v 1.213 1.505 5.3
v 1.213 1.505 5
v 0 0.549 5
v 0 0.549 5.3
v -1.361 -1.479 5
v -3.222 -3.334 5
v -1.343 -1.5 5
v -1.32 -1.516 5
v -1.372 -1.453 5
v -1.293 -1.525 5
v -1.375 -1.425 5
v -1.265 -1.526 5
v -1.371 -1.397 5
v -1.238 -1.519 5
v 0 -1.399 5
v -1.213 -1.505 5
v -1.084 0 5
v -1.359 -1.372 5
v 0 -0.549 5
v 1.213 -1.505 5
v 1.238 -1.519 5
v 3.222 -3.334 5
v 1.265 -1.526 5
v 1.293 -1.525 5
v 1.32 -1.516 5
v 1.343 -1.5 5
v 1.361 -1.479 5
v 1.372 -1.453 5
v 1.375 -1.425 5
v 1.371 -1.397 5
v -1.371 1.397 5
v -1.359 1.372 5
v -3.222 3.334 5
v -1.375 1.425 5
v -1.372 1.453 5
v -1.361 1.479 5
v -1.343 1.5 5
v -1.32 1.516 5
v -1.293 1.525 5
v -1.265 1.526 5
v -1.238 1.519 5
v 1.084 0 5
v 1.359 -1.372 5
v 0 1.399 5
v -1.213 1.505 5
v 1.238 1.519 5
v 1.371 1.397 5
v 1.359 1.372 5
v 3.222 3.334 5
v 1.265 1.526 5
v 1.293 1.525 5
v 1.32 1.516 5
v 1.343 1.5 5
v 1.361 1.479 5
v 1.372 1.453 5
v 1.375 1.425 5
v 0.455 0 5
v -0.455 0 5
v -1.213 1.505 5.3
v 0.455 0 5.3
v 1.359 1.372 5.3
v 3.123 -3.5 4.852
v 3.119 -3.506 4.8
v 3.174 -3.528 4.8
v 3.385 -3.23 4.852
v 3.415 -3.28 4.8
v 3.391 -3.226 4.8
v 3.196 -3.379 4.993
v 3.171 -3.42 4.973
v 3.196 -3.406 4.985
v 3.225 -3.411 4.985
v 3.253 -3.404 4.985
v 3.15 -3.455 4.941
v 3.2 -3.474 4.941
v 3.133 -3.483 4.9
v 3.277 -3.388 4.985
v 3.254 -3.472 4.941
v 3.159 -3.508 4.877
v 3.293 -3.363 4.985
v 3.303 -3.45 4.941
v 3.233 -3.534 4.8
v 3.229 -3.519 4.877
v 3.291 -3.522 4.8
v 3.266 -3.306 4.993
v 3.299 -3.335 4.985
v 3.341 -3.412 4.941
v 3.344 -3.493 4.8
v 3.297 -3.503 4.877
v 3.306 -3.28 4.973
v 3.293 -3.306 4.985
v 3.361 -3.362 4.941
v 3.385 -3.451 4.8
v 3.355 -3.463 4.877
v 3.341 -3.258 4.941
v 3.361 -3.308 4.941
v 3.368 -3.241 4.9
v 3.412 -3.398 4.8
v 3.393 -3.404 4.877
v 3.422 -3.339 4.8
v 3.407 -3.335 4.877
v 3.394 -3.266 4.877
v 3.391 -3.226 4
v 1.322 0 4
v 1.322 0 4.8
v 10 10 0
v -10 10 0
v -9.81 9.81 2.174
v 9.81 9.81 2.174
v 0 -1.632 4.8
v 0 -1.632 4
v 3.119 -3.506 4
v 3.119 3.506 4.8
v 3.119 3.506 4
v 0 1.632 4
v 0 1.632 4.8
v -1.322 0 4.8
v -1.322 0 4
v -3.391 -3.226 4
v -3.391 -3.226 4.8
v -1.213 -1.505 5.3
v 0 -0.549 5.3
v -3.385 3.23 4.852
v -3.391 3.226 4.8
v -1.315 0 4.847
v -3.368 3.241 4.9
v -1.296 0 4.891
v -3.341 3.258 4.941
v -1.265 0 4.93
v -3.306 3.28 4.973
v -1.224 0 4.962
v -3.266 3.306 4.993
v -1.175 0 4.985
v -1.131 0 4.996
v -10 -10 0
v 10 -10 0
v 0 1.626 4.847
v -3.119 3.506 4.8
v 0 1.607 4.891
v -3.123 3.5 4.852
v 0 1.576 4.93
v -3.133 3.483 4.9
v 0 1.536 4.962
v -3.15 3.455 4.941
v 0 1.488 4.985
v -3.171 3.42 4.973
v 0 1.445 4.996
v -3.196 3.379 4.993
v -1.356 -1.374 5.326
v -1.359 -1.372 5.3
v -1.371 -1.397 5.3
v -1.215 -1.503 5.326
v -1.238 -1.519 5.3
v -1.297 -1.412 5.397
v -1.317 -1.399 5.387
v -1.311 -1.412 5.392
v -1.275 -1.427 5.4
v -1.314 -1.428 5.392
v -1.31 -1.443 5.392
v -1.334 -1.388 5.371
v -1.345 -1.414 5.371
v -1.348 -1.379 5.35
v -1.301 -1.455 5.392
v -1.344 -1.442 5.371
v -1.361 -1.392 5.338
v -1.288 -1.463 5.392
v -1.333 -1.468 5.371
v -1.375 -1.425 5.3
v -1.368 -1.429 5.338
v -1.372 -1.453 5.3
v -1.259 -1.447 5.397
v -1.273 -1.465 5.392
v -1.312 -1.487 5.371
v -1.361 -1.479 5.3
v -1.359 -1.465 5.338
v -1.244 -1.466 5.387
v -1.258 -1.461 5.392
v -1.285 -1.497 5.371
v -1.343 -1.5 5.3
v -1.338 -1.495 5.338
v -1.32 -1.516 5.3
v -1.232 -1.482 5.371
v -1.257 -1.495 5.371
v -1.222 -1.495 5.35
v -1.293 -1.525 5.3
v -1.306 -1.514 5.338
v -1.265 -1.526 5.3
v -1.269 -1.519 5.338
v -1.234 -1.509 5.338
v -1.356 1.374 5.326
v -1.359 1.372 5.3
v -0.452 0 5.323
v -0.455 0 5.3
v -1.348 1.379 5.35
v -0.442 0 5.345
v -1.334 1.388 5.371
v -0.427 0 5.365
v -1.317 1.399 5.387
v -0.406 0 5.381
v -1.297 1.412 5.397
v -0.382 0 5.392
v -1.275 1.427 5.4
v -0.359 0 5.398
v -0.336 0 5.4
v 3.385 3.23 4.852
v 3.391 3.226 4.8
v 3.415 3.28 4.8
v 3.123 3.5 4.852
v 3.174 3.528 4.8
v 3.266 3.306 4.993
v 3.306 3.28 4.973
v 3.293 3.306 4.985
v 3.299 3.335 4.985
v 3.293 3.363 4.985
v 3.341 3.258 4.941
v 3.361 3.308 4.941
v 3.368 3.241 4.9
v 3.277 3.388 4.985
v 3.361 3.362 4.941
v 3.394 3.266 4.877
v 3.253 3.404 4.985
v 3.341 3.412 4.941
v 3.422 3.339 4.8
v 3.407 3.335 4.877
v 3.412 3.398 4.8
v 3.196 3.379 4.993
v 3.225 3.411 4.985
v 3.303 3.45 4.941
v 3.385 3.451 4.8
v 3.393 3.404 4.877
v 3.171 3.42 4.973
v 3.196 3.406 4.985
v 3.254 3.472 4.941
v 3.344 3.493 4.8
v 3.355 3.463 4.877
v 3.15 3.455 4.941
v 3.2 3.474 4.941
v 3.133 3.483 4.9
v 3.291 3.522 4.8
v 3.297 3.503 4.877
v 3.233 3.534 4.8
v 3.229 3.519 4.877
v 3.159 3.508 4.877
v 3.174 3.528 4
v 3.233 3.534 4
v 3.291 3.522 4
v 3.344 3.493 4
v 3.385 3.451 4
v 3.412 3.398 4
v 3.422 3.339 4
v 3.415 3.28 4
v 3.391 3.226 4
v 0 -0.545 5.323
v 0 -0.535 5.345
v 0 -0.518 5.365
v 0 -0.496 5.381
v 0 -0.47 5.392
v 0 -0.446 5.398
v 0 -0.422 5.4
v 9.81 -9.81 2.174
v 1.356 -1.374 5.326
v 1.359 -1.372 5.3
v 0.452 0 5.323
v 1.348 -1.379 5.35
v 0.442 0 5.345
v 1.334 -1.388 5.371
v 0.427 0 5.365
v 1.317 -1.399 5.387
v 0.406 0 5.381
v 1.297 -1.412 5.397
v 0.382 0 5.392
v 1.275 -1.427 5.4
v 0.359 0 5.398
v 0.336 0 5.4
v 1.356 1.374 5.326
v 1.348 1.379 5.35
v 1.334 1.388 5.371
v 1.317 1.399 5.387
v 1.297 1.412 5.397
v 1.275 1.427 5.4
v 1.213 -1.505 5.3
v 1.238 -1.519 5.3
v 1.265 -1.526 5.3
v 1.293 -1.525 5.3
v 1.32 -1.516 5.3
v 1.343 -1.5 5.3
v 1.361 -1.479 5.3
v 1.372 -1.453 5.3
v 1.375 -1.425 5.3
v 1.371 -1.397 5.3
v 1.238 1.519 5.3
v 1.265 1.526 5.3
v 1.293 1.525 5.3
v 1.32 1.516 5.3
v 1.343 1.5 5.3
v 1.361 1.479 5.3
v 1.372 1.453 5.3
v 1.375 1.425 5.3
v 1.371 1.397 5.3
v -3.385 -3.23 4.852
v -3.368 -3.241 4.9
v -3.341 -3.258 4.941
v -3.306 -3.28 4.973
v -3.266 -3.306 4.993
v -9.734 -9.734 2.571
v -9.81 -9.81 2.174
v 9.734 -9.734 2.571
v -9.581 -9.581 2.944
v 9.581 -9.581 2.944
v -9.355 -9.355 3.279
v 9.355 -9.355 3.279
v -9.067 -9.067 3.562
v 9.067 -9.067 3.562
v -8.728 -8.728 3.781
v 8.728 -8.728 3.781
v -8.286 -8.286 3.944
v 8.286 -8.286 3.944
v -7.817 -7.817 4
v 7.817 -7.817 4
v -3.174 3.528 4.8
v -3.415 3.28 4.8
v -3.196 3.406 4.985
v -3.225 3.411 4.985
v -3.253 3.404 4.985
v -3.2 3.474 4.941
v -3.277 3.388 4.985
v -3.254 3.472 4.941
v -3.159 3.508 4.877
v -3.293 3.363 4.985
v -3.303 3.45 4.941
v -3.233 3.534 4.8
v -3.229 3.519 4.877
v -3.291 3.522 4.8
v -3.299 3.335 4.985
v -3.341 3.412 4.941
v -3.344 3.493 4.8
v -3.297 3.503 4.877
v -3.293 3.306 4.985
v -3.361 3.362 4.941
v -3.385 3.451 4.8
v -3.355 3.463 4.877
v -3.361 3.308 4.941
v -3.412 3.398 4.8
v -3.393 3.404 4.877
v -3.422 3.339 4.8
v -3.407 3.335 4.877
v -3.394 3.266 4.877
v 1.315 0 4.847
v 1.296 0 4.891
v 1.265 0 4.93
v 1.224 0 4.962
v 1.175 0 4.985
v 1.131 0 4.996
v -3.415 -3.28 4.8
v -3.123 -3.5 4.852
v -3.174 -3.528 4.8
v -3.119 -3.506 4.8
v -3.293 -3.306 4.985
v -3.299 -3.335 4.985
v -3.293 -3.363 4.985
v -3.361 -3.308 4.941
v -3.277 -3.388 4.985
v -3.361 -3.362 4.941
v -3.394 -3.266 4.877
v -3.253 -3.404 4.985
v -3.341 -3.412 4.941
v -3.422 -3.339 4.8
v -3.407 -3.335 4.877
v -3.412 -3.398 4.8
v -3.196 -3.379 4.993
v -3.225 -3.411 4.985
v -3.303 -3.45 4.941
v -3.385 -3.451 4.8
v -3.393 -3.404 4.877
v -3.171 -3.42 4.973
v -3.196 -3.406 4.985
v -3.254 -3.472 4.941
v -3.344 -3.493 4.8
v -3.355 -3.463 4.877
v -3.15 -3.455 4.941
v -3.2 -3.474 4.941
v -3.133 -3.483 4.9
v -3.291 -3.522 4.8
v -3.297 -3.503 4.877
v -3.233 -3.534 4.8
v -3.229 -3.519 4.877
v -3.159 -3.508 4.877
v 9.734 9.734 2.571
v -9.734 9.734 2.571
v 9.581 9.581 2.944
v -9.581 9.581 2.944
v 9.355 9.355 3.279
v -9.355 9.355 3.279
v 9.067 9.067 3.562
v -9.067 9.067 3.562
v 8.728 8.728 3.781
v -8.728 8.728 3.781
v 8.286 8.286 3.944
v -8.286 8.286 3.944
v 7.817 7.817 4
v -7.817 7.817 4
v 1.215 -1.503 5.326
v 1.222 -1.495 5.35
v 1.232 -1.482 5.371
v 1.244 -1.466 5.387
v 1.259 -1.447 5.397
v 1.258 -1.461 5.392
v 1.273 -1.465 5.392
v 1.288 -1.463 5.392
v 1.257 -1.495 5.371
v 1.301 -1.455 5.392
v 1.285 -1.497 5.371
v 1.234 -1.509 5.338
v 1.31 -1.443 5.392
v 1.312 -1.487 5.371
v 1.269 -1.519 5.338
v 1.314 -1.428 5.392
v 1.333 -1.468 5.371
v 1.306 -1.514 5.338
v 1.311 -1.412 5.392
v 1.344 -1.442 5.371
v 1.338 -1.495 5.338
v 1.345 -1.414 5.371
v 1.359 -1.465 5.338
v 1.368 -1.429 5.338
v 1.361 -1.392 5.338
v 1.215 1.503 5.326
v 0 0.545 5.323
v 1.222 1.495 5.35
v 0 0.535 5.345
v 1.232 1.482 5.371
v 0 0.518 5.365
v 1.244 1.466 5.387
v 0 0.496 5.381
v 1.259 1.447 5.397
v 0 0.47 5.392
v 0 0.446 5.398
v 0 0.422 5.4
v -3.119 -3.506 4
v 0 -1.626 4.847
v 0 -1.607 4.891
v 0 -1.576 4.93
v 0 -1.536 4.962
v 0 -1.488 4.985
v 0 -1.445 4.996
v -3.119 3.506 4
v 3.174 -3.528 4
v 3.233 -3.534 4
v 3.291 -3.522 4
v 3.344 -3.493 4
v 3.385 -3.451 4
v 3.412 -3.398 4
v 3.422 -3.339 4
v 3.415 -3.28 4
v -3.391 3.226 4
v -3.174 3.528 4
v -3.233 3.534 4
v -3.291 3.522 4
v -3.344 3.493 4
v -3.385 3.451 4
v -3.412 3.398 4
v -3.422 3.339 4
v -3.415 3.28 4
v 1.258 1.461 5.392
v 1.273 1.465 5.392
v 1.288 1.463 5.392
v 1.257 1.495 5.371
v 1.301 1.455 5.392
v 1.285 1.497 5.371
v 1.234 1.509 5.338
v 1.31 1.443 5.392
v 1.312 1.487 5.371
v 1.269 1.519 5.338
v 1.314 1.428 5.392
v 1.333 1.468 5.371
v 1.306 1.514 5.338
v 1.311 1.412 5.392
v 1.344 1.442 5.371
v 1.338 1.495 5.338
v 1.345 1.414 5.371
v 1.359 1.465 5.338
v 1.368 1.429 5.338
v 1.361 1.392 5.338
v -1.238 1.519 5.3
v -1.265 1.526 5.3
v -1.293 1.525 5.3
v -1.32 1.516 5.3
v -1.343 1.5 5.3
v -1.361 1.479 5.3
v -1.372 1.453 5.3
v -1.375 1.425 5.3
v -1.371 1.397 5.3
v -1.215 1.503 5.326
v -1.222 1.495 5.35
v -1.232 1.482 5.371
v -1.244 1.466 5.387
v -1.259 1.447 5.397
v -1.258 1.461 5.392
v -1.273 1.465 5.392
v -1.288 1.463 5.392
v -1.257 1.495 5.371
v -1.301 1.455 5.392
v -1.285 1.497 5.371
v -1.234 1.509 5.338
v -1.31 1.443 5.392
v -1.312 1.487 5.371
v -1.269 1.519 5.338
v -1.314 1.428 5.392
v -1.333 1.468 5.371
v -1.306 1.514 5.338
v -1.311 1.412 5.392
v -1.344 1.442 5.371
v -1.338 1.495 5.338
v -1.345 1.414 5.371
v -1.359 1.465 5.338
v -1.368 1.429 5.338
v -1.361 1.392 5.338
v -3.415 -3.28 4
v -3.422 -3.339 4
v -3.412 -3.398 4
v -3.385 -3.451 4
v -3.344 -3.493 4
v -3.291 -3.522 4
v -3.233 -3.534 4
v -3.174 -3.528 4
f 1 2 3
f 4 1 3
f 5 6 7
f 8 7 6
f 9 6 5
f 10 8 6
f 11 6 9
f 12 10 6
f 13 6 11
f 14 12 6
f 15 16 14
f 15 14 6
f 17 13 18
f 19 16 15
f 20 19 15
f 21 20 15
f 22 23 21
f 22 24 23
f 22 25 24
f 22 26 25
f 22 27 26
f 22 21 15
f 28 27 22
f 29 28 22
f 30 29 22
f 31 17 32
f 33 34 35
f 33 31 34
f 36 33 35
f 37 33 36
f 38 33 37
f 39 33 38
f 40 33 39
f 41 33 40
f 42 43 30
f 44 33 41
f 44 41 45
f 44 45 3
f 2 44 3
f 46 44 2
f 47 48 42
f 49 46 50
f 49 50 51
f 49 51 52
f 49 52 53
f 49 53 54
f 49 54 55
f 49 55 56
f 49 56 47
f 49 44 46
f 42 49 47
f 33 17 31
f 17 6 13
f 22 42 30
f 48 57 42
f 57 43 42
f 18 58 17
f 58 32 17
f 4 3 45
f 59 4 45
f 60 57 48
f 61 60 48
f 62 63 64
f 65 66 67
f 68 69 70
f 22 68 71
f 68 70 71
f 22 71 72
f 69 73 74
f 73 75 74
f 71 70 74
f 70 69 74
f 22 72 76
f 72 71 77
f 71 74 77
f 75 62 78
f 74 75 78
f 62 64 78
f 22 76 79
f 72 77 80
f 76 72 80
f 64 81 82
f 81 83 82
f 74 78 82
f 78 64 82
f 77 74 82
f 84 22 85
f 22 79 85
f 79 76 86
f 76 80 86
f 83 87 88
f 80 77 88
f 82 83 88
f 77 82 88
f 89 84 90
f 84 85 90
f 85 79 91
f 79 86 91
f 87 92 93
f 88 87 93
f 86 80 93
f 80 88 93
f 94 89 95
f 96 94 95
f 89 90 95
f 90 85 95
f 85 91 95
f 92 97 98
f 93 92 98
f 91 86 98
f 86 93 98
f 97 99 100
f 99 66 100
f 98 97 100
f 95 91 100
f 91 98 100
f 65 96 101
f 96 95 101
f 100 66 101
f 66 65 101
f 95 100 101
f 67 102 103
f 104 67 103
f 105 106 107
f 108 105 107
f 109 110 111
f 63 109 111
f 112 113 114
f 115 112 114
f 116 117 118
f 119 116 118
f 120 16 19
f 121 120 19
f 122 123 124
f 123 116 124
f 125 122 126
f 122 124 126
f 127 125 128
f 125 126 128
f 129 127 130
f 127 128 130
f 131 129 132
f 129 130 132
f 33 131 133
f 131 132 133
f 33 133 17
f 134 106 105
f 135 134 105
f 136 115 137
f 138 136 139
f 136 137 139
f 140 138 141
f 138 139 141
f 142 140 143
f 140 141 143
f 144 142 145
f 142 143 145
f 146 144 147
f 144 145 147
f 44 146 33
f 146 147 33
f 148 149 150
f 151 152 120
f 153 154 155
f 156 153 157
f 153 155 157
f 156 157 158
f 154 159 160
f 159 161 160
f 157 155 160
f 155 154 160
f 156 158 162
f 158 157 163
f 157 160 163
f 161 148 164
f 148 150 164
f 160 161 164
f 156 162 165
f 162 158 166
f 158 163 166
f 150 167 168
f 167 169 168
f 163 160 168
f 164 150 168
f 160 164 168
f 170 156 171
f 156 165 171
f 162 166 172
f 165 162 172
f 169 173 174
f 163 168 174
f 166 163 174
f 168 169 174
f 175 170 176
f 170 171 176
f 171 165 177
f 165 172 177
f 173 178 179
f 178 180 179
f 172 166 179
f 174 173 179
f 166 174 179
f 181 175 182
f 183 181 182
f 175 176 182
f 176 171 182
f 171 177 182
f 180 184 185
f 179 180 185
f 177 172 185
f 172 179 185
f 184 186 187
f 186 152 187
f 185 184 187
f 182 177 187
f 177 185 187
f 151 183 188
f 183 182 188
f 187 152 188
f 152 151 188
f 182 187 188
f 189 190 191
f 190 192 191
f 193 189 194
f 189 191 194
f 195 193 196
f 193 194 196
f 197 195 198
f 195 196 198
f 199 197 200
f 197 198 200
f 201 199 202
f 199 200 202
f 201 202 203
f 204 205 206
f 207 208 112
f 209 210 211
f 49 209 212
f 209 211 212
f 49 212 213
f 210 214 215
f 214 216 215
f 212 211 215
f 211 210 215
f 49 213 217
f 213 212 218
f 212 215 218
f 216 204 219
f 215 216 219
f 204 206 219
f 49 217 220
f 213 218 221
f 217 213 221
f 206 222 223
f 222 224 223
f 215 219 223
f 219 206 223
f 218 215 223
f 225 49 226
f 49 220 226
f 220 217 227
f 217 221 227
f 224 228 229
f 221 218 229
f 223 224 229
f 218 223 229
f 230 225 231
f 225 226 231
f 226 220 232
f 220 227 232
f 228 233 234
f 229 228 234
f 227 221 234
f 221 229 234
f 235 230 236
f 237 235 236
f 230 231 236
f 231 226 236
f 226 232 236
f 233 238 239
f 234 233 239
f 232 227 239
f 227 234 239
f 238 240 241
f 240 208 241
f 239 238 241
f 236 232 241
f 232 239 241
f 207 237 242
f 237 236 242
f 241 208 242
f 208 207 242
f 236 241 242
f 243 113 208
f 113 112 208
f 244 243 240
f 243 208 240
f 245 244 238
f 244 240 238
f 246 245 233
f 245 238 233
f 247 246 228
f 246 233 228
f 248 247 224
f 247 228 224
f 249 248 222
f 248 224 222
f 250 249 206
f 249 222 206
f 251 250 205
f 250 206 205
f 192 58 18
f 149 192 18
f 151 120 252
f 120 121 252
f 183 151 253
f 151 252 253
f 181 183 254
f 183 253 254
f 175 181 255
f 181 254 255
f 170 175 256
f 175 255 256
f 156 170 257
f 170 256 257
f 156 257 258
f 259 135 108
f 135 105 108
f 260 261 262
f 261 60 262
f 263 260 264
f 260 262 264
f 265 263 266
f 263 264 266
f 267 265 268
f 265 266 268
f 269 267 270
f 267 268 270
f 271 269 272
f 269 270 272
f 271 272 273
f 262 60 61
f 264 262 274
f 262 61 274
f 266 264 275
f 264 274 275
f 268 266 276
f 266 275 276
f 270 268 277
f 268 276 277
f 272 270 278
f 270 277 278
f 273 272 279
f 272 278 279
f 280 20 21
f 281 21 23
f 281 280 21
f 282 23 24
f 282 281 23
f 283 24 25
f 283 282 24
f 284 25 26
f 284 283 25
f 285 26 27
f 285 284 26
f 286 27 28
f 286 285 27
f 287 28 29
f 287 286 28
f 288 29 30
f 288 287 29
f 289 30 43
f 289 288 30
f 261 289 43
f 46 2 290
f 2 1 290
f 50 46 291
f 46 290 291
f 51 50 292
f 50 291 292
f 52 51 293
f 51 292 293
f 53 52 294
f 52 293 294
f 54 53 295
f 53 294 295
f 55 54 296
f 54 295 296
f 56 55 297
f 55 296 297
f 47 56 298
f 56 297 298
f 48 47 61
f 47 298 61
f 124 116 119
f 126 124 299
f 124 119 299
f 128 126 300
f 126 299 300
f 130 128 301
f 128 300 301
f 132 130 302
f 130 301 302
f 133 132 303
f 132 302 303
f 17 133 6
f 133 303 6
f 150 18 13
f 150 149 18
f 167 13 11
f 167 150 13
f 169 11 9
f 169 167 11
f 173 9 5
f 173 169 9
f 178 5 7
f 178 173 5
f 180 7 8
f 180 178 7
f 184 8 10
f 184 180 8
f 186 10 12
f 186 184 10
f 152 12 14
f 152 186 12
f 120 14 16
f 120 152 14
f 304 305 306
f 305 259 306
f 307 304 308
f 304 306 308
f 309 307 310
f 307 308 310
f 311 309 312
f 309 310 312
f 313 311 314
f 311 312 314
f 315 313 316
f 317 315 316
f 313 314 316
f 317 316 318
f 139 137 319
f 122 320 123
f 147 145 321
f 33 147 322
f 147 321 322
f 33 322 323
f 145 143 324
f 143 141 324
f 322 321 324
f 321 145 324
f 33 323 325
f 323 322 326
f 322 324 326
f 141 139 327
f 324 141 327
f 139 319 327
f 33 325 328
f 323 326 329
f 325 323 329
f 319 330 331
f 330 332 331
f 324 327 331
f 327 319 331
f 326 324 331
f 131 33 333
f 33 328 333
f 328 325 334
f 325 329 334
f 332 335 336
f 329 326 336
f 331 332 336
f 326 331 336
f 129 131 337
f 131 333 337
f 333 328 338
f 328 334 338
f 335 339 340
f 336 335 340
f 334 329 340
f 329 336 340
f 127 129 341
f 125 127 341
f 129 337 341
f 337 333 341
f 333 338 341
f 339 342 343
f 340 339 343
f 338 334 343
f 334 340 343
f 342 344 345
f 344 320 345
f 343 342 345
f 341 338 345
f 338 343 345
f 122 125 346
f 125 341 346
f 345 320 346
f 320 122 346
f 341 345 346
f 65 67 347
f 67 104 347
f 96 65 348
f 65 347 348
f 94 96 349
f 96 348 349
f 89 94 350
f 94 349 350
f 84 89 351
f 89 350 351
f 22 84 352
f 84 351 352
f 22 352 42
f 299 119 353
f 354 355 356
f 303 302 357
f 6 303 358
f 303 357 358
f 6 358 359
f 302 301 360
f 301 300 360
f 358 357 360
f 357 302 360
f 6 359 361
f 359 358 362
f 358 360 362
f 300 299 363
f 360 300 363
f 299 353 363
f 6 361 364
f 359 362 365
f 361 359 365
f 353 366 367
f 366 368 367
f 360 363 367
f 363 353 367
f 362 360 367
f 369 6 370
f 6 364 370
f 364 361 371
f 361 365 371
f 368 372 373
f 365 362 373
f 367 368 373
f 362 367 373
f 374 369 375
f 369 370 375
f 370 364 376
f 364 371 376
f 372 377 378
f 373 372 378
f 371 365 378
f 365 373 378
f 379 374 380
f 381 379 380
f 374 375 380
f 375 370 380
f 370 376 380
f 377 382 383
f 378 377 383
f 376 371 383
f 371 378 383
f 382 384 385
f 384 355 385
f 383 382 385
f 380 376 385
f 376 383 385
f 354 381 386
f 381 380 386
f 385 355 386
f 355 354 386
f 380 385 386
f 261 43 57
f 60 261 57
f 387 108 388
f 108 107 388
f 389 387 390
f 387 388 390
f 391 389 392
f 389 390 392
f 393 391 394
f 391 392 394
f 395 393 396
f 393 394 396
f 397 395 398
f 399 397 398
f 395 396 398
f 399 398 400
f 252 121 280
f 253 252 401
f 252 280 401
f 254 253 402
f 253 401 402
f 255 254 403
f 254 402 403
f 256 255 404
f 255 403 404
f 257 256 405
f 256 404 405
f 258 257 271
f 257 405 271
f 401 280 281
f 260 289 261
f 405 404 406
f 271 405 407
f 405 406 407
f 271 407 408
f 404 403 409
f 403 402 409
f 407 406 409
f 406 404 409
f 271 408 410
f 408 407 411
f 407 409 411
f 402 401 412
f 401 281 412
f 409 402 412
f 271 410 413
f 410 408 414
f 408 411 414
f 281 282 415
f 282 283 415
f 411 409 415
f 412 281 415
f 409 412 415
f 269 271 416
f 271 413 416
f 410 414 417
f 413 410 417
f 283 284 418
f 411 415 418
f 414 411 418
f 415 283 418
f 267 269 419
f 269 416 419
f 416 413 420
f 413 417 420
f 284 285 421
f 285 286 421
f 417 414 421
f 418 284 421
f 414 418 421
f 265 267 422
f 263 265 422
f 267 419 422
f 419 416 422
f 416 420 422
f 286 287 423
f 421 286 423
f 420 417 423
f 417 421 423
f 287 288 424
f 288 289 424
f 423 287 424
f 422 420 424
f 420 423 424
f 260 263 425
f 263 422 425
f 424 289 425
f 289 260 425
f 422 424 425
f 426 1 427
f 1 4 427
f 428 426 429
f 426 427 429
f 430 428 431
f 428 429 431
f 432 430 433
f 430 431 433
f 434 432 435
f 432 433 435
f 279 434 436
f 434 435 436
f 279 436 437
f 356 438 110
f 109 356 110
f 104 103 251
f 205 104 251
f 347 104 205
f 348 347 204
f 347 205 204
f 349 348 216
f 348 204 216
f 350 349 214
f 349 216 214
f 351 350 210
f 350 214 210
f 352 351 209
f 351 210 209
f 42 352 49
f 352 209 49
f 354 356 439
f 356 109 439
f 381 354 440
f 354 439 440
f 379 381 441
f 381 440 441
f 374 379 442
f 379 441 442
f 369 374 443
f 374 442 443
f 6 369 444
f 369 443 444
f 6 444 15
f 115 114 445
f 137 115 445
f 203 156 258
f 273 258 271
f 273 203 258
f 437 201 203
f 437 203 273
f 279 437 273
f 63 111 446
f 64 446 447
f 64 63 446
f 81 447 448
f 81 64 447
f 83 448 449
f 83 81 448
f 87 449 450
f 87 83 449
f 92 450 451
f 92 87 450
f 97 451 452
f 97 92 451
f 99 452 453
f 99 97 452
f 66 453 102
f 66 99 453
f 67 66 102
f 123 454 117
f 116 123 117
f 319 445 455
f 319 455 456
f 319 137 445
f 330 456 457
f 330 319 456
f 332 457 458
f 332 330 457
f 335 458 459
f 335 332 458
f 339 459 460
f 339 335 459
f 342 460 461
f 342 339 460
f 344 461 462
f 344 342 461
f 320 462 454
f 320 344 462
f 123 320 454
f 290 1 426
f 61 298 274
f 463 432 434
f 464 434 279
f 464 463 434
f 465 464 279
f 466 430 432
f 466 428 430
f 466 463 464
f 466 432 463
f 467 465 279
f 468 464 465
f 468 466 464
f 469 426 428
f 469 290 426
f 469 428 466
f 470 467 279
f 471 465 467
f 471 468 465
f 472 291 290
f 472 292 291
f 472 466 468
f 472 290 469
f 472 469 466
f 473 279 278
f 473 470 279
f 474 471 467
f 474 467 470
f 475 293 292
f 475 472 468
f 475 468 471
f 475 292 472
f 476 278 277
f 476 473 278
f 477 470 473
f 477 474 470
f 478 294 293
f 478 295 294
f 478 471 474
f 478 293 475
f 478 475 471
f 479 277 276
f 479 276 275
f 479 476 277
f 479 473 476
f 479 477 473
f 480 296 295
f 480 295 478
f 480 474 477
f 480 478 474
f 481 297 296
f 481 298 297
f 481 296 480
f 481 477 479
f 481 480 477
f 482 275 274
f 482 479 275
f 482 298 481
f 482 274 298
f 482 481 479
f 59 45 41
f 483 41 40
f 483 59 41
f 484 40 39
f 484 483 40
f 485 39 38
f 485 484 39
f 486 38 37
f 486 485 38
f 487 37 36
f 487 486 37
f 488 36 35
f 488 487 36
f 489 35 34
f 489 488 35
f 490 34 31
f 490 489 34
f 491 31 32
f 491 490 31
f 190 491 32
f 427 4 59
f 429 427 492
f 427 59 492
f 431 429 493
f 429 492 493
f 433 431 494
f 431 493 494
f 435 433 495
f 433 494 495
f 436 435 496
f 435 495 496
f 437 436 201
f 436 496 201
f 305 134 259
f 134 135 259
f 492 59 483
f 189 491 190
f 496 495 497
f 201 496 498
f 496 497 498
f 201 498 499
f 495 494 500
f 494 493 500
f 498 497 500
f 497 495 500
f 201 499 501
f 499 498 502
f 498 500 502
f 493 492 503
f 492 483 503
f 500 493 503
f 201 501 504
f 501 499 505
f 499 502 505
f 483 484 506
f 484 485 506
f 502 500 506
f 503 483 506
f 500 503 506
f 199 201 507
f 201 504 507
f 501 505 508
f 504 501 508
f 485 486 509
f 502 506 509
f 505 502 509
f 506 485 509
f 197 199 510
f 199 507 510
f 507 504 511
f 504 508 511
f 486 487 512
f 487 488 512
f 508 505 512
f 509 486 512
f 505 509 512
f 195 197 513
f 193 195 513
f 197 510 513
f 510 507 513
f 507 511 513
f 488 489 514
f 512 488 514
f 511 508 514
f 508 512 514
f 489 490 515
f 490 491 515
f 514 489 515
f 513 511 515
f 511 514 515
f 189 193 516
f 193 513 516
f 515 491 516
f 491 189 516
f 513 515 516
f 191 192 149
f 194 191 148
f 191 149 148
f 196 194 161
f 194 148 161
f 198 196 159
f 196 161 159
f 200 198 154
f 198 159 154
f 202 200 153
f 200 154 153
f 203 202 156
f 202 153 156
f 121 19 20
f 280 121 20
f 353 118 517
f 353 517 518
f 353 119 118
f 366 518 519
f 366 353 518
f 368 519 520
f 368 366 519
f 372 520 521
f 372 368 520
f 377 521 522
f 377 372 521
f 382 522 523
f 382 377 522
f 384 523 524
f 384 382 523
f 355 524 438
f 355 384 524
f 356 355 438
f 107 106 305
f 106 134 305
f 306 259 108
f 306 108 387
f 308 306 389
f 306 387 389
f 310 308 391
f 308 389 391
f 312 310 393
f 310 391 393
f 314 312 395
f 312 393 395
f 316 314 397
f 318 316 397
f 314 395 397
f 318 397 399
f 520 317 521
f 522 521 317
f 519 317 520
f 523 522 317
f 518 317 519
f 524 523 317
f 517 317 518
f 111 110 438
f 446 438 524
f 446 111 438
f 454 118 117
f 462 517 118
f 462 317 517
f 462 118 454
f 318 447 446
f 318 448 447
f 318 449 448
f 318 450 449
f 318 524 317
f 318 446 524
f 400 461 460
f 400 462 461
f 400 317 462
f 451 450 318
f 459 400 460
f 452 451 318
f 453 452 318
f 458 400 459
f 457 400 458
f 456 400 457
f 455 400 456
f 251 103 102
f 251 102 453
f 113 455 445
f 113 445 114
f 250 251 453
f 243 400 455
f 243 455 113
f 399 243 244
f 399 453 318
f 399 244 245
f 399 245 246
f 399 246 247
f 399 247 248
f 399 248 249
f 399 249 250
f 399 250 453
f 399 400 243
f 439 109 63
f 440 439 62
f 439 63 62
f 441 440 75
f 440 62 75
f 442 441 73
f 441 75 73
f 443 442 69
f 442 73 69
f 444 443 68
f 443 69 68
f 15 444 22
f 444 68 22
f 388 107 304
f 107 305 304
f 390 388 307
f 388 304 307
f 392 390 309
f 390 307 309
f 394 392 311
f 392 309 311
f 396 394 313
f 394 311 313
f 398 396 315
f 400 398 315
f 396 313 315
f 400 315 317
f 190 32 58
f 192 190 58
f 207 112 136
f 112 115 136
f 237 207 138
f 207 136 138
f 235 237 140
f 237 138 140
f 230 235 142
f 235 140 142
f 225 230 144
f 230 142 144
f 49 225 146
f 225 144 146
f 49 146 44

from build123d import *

# Parameters (mm, degrees)
F0_W     = 20
F0_H     = 20
F1_DEPTH = 4
F1_TAPER = 5
F2_R     = 2
F4_DEPTH = 1
F5_R     = 0.2
F7_DEPTH = 0.4
F8_R     = 0.1


with BuildPart() as f1:
    # F0 (on Top) → F1 (new body)
    with BuildSketch(Plane.XY):
        Rectangle(F0_W, F0_H)
    extrude(amount=F1_DEPTH, taper=F1_TAPER)

    # F2
    f2_edges = [f1.edges().sort_by_distance(p)[0] for p in [
        (9.650045, 0, 4),
        (0, 9.650045, 4),
        (-9.650045, 0, 4),
        (0, -9.650045, 4),
    ]]
    fillet(f2_edges, radius=F2_R)

    # F3 (on face) → F4 (join)
    with BuildSketch(Plane.XY.offset(4)):
        Polygon((3.8520088419, 3.9457110688), (0, 1.6323694726), (-3.8520088419, 3.9457110688), (-1.3217914384, 0), (-3.8520088419, -3.9457110688), (0, -1.6323694726), (3.8520088419, -3.9457110688), (1.3217914384, 0), align=None)
    extrude(amount=F4_DEPTH)

    # F5
    f5_edges = [f1.edges().sort_by_distance(p)[0] for p in [
        (2.5869, 1.972856, 5),
        (1.926004, 2.78904, 5),
        (-1.926004, 2.78904, 5),
        (-2.5869, 1.972856, 5),
        (-2.5869, -1.972856, 5),
        (-1.926004, -2.78904, 5),
        (1.926004, -2.78904, 5),
        (2.5869, -1.972856, 5),
        (-3.852009, 3.945711, 4.5),
        (-3.852009, -3.945711, 4.5),
        (3.852009, 3.945711, 4.5),
        (3.852009, -3.945711, 4.5),
    ]]
    fillet(f5_edges, radius=F5_R)

    # F6 (on face) → F7 (join)
    with BuildSketch(Plane.XY.offset(5)):
        Polygon((1.6986121191, 1.8877194962), (0, 0.5488963798), (-1.6986121191, 1.8877194962), (-0.4554191546, 0), (-1.6986121191, -1.8877194962), (0, -0.5488963798), (1.6986121191, -1.8877194962), (0.4554191546, 0), align=None)
    extrude(amount=F7_DEPTH)

    # F8
    f8_edges = [f1.edges().sort_by_distance(p)[0] for p in [
        (0.849306, 1.218308, 5.4),
        (-0.849306, 1.218308, 5.4),
        (-1.077016, 0.94386, 5.4),
        (-1.077016, -0.94386, 5.4),
        (-0.849306, -1.218308, 5.4),
        (0.849306, -1.218308, 5.4),
        (1.077016, -0.94386, 5.4),
        (1.077016, 0.94386, 5.4),
        (1.698612, 1.887719, 5.2),
        (1.698612, -1.887719, 5.2),
        (-1.698612, -1.887719, 5.2),
        (-1.698612, 1.887719, 5.2),
    ]]
    fillet(f8_edges, radius=F8_R)


solid = f1.part
